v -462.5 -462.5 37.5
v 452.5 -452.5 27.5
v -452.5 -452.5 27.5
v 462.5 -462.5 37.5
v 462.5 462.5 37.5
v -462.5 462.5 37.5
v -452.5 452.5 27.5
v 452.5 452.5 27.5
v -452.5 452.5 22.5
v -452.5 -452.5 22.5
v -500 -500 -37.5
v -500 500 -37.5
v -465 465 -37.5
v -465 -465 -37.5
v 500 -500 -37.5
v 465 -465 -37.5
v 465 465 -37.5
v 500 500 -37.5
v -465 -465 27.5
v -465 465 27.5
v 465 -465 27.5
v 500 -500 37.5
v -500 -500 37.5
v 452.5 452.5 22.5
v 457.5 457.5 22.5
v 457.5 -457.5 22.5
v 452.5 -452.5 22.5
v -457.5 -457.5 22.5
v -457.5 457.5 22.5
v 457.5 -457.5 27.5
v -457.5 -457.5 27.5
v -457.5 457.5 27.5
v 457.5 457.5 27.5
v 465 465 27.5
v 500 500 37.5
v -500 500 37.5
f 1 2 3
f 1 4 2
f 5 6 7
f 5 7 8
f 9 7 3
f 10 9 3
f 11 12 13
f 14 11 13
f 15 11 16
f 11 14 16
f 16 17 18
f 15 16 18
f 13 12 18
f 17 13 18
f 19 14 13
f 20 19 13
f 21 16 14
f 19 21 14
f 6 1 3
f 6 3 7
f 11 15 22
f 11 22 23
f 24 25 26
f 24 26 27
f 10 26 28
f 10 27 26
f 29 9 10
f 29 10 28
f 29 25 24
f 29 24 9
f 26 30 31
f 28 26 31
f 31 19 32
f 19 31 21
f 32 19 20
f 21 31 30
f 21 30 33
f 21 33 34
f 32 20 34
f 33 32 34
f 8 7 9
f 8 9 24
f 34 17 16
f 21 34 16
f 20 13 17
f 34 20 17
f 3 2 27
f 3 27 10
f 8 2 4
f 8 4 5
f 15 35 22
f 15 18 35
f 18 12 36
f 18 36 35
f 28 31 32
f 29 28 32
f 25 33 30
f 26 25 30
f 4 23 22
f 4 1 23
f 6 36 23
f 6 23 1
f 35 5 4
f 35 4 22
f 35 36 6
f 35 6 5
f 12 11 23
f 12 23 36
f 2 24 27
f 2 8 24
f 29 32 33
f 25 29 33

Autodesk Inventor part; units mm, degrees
ref_plane "YZ Plane" through (0, 0, 0) normal (1, 0, 0) x (0, 1, 0)
ref_plane "XZ Plane" through (0, 0, 0) normal (0, 1, 0) x (-1, 0, 0)
ref_plane "XY Plane" through (0, 0, 0) normal (0, 0, 1) x (1, 0, 0)
sketch "Szkic1" plane through (0, 0, 0) normal (0, 0, 1) x (1, 0, 0)
  line L0 (500, -500) -> (-500, -500)
  line L1 (-500, -500) -> (-500, 500)
  line L2 (-500, 500) -> (500, 500)
  line L3 (500, 500) -> (500, -500)
  line L4 (500, -500) -> (-500, 500) construction
  line L5 (-500, -500) -> (500, 500) construction
  line L6 (465, -465) -> (-465, -465)
  line L7 (-465, -465) -> (-465, 465)
  line L8 (-465, 465) -> (465, 465)
  line L9 (465, 465) -> (465, -465)
  line L10 (465, -465) -> (-465, 465) construction
  line L11 (-465, -465) -> (465, 465) construction
  point P0 (0, 0)
  dimension "d0" = 1000
  dimension "d1" = 1000
  dimension "d2" = 930
  dimension "d3" = 930
extrude "Wyciągnięcie proste1" add sketch "Szkic1" along normal mid plane 75
sketch "Szkic2" plane through (0, 0, 37.5) normal (0, 0, 1) x (1, 0, 0)
  line L0 (465, -465) -> (465, 465) projected
  line L1 (-465, 465) -> (465, 465)
  line L2 (465, 465) -> (465, -465)
  line L3 (465, -465) -> (-465, -465)
  line L4 (-465, -465) -> (-465, 465)
  line L5 (-465, 465) -> (465, -465) construction
  line L6 (465, 465) -> (-465, -465) construction
  line L7 (-452.5, 452.5) -> (452.5, 452.5)
  line L8 (452.5, 452.5) -> (452.5, -452.5)
  line L9 (452.5, -452.5) -> (-452.5, -452.5)
  line L10 (-452.5, -452.5) -> (-452.5, 452.5)
  line L11 (-452.5, 452.5) -> (452.5, -452.5) construction
  line L12 (452.5, 452.5) -> (-452.5, -452.5) construction
  point P0 (0, 0)
  dimension "d6" = 905
  dimension "d7" = 905
extrude "Wyciągnięcie proste2" add sketch "Szkic2" against normal blind 10
chamfer "Faza1" distance 10 angle 45 4 edges at (452.5, 0, 37.5) (0, 452.5, 37.5) (-452.5, 0, 37.5) (0, -452.5, 37.5)
ref_plane "Płaszczyzna konstrukcyjna1" through (-452.5, 452.5, 27.5) normal (0, 0, 1) x (0, -1, 0)
sketch "Szkic3" plane through (0, 0, 27.5) normal (0, 0, -1) x (-1, 0, 0)
  line L0 (452.5, 452.5) -> (452.5, -452.5) projected
  line L1 (-452.5, -452.5) -> (452.5, -452.5)
  line L2 (452.5, -452.5) -> (452.5, 452.5)
  line L3 (452.5, 452.5) -> (-452.5, 452.5)
  line L4 (-452.5, 452.5) -> (-452.5, -452.5)
  line L5 (-452.5, -452.5) -> (452.5, 452.5) construction
  line L6 (452.5, -452.5) -> (-452.5, 452.5) construction
  line L7 (-457.5, -457.5) -> (457.5, -457.5)
  line L8 (457.5, -457.5) -> (457.5, 457.5)
  line L9 (457.5, 457.5) -> (-457.5, 457.5)
  line L10 (-457.5, 457.5) -> (-457.5, -457.5)
  line L11 (-457.5, -457.5) -> (457.5, 457.5) construction
  line L12 (457.5, -457.5) -> (-457.5, 457.5) construction
  point P0 (0, 0)
  dimension "d13" = 915
extrude "Wyciągnięcie proste3" add sketch "Szkic3" along normal blind 5
properties part number "rama" material "Tworzywo sztuczne PC/ABS"
